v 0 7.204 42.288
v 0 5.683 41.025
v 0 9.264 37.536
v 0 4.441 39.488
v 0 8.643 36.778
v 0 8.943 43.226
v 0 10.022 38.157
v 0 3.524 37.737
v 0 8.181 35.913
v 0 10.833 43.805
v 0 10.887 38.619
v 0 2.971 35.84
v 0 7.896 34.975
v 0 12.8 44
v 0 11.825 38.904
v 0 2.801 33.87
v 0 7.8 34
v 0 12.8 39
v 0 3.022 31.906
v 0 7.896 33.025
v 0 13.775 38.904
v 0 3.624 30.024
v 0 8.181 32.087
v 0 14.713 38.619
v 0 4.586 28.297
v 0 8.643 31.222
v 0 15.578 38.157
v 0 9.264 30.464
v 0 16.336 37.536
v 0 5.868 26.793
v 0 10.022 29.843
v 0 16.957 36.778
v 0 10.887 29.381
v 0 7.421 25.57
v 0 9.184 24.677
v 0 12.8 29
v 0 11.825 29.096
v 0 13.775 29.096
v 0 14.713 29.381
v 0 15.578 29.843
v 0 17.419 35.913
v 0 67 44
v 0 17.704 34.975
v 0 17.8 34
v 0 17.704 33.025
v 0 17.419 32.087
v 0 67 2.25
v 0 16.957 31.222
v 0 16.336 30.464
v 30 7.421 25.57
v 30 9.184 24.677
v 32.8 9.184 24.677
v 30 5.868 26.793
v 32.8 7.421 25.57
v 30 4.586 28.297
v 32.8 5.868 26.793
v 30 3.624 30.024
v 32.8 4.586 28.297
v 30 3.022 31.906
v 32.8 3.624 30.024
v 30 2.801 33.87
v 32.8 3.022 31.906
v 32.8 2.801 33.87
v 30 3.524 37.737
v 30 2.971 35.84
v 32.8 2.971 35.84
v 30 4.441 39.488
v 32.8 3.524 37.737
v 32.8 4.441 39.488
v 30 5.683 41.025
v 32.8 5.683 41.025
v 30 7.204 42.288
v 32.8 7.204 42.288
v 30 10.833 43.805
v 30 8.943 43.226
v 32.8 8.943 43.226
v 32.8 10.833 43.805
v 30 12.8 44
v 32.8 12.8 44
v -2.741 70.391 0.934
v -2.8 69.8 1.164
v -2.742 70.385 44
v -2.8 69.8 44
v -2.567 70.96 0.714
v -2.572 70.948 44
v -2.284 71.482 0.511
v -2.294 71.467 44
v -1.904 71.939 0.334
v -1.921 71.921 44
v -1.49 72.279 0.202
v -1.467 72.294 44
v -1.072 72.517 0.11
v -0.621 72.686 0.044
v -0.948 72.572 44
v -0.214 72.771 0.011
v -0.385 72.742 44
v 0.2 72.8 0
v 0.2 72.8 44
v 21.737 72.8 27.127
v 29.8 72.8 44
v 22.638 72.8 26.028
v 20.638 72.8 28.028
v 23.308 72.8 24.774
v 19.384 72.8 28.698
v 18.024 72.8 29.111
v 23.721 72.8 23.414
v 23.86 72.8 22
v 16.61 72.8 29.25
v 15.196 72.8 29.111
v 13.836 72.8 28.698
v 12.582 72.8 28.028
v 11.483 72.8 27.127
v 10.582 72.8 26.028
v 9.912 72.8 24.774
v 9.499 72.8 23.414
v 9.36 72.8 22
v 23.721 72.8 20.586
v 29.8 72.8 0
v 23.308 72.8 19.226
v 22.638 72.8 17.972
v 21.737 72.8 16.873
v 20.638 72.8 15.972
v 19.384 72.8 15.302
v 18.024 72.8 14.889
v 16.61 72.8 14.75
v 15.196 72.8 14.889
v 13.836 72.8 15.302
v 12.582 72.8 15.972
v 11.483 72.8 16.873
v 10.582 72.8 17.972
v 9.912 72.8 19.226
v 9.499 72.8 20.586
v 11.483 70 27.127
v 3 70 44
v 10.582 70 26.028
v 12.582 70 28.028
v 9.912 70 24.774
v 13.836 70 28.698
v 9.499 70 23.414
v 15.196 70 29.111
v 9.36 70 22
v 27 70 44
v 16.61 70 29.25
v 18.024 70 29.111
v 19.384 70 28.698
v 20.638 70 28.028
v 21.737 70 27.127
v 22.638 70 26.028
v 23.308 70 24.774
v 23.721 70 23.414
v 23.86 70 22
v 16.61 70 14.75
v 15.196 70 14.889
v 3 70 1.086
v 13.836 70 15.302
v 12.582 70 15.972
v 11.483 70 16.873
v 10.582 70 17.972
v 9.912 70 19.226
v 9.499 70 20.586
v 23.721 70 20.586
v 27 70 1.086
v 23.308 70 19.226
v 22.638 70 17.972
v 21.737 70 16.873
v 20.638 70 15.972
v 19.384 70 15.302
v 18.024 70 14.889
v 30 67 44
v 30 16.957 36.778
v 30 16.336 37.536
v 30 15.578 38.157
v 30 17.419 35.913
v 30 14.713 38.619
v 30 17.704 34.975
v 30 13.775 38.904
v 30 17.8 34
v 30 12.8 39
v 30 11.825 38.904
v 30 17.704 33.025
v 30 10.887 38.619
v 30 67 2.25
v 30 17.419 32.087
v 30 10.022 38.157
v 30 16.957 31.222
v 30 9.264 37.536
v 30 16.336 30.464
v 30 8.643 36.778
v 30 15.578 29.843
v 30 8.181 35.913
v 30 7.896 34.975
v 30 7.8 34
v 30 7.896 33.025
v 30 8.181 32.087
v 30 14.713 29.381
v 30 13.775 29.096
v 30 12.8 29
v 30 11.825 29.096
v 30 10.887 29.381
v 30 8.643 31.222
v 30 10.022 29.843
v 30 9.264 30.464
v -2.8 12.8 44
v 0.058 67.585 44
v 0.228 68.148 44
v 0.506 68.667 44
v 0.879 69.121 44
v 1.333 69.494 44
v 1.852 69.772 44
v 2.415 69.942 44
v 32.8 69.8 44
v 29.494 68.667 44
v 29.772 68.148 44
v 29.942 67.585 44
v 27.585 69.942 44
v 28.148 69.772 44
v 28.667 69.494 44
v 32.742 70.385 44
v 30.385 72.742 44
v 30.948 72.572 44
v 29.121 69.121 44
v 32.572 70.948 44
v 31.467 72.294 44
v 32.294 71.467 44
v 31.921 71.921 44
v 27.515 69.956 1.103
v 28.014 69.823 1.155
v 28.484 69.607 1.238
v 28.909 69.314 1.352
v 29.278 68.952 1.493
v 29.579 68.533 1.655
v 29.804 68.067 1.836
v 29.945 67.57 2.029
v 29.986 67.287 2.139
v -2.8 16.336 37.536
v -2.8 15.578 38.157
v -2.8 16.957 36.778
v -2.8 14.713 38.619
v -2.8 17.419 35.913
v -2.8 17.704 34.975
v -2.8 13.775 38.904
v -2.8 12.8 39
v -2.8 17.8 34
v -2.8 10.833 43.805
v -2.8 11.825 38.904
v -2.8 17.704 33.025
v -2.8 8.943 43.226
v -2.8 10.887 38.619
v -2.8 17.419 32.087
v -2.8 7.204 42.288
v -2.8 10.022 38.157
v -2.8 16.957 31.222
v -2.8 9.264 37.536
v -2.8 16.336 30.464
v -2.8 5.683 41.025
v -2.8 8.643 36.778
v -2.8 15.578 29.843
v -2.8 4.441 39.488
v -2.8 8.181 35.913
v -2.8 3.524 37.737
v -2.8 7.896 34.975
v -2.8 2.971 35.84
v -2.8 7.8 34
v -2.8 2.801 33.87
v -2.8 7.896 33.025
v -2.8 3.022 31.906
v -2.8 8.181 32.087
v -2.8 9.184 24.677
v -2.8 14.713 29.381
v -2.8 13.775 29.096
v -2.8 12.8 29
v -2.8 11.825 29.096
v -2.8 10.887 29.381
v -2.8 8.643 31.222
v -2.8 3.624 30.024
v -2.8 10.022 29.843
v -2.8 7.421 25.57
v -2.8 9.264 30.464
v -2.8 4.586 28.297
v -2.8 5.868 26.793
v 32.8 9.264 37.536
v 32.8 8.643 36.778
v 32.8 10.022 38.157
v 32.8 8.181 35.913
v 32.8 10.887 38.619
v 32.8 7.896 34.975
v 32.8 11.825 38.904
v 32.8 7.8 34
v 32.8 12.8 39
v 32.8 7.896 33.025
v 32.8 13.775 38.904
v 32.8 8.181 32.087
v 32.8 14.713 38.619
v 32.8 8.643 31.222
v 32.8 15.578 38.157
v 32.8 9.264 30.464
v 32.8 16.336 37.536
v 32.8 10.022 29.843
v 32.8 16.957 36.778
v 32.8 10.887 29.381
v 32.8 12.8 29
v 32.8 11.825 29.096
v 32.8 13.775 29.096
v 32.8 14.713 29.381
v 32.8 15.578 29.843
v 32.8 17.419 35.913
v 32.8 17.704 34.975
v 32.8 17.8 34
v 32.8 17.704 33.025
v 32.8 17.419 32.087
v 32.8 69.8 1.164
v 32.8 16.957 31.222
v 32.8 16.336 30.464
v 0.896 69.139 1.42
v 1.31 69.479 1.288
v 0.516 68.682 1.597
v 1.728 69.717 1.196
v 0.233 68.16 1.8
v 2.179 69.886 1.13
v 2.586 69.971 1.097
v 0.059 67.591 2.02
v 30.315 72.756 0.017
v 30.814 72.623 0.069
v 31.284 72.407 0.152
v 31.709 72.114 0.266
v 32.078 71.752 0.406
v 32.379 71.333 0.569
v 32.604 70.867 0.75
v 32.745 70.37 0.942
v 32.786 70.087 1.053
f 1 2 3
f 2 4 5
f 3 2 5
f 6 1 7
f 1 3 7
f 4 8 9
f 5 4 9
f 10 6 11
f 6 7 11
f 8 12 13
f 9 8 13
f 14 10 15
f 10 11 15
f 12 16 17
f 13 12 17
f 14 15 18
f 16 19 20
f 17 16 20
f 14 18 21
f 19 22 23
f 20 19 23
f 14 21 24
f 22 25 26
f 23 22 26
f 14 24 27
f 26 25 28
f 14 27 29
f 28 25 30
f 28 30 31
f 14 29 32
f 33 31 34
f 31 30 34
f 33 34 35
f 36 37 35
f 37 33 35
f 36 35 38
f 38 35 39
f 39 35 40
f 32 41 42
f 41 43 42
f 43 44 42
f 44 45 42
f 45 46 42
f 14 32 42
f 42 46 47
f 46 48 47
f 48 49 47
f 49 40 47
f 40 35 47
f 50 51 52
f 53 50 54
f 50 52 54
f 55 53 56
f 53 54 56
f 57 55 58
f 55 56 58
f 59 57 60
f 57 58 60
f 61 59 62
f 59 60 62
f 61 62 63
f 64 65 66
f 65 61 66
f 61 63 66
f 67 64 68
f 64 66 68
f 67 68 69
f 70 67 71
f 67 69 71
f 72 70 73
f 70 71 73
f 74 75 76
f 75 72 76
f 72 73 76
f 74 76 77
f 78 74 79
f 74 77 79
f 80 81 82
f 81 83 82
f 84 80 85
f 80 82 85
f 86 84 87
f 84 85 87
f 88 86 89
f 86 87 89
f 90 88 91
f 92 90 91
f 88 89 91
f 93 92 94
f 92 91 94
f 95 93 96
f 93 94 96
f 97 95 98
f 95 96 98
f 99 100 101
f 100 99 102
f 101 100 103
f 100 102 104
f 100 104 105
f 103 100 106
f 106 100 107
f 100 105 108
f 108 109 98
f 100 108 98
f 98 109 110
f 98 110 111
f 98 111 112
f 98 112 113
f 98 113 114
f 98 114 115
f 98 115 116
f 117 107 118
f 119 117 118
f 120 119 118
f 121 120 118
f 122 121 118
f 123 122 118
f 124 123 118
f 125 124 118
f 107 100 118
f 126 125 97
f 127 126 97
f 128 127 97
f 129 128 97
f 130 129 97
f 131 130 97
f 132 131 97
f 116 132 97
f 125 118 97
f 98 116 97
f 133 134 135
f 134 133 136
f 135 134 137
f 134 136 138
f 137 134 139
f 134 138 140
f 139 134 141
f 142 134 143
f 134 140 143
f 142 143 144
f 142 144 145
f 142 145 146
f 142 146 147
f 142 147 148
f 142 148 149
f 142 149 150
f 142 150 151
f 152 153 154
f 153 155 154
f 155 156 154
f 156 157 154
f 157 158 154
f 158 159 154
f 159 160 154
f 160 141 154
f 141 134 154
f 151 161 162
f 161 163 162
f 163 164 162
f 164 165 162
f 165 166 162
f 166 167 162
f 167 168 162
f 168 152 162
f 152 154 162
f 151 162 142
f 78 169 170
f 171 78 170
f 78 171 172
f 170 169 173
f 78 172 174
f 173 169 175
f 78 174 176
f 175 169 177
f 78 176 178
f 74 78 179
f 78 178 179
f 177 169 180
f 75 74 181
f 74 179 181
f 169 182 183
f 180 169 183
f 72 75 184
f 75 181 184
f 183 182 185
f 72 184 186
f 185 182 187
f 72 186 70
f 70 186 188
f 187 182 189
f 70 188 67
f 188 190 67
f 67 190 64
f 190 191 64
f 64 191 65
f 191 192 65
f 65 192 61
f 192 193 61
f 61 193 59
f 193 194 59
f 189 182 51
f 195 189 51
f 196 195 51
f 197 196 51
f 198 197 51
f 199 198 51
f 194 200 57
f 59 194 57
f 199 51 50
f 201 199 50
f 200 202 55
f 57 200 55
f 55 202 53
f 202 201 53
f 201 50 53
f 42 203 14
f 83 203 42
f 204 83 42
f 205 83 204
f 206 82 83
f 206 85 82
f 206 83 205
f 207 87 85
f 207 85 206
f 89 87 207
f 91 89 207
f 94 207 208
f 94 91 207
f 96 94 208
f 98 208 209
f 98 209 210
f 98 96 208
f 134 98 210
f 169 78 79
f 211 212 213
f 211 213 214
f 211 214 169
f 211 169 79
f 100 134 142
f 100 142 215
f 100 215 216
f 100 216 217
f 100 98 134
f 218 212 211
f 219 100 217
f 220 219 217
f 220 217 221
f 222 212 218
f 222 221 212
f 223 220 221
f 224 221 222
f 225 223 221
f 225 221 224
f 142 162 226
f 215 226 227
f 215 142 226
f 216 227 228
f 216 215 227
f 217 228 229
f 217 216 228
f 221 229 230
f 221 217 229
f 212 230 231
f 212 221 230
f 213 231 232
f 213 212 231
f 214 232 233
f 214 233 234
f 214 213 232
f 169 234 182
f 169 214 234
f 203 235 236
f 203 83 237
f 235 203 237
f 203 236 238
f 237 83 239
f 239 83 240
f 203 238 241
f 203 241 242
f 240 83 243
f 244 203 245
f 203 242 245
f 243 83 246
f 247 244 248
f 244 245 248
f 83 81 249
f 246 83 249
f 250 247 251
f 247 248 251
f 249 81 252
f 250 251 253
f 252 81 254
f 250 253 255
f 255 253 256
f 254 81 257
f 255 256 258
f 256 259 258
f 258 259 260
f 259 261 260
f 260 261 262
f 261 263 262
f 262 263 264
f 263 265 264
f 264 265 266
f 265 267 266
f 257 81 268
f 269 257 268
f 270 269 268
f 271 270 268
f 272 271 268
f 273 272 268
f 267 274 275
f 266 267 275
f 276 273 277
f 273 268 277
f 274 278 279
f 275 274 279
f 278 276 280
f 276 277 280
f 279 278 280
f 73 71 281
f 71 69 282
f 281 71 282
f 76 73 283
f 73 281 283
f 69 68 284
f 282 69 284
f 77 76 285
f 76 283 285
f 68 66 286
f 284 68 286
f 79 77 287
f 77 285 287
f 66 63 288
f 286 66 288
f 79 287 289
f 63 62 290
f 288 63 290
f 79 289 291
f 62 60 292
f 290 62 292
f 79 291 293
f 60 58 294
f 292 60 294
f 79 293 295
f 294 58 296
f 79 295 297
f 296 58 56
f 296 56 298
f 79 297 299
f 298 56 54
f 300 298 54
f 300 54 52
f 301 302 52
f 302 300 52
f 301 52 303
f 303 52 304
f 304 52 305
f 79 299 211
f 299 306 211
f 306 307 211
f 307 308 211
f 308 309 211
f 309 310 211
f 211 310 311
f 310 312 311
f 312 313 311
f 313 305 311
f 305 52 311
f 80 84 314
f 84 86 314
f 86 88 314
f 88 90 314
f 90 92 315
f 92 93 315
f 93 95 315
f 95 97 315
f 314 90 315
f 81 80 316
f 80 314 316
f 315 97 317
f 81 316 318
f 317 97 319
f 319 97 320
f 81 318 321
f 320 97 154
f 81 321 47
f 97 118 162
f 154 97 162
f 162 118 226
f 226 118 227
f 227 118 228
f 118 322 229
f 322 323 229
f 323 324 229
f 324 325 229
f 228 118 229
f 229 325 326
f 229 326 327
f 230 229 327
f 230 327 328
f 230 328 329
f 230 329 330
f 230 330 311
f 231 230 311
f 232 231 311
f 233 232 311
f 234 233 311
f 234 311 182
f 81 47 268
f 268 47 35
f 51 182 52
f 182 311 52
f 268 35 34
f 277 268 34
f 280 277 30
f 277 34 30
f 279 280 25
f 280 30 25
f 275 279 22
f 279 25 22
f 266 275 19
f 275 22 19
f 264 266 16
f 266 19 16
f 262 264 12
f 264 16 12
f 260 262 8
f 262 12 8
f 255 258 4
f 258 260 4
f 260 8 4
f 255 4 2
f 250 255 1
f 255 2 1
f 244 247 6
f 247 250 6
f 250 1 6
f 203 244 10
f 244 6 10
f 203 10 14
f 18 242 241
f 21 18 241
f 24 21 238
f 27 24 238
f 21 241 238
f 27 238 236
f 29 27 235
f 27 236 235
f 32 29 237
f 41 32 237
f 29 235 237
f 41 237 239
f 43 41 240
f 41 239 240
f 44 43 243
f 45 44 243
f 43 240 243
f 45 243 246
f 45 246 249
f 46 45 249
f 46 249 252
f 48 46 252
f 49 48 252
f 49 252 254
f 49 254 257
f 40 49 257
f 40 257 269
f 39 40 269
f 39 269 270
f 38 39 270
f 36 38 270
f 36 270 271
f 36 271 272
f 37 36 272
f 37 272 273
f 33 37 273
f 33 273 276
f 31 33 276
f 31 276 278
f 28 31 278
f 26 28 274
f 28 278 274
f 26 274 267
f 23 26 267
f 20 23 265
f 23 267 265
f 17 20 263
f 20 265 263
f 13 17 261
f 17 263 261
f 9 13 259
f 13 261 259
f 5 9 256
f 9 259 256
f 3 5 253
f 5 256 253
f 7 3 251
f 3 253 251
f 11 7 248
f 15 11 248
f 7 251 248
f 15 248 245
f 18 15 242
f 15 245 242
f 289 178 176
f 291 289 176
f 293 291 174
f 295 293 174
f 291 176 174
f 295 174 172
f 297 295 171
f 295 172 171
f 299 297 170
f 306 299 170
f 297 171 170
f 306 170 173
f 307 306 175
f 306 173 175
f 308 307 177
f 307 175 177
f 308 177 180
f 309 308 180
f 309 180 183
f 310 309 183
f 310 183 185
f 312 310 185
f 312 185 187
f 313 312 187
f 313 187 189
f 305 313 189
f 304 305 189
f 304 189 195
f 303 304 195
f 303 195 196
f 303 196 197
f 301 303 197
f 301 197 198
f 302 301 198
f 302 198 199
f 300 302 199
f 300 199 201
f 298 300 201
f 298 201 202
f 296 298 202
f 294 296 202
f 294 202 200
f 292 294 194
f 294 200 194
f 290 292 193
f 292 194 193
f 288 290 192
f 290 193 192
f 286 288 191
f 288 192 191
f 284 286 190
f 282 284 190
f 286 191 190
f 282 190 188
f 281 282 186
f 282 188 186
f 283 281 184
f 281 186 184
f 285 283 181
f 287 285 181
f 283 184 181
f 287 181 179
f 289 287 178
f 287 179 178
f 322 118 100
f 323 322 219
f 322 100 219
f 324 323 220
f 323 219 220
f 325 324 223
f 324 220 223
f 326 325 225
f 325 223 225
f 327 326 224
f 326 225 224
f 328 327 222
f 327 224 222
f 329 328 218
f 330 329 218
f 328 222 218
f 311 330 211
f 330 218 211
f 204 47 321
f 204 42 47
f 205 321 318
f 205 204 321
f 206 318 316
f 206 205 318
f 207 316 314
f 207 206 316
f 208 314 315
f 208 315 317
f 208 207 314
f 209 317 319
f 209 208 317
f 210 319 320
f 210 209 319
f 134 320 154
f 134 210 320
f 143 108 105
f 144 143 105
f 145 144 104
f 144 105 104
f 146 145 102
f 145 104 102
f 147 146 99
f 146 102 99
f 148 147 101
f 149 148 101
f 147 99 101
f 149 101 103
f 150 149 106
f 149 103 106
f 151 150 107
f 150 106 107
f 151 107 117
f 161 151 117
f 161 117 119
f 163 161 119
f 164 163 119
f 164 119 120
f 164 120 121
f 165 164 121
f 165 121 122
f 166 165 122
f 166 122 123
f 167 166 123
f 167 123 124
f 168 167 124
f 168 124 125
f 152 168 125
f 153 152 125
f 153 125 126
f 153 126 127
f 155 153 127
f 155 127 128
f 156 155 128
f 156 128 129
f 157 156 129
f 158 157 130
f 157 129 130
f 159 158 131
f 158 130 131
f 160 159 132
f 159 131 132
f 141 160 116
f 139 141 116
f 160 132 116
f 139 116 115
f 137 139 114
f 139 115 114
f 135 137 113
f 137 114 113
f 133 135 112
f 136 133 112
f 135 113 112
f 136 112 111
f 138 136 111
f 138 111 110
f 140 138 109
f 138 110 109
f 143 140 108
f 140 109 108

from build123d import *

# Parameters (mm, degrees)
EXTRUDE_THIN1_DEPTH = 44
SKETCH3_OUTSIDE_W   = 64.442
SKETCH3_OUTSIDE_H   = 93.242
CUT_EXTRUDE1_DEPTH  = 93.212797377
SKETCH4_R           = 5
CUT_EXTRUDE2_DEPTH  = 93.212797377
SKETCH5_R           = 7.25
CUT_EXTRUDE3_DEPTH  = 10
FILLET3_R           = 3


with BuildPart() as part:
    # Sketch1 → Extrude-Thin1 (new body)
    with BuildSketch(Plane.XY):
        Polygon((0, 0), (0, 70), (30, 70), (30, 0), (32.8, 0), (32.8, 72.8), (-2.8, 72.8), (-2.8, 0), align=None)
    extrude(amount=EXTRUDE_THIN1_DEPTH)

    # Sketch3 outside → Cut-Extrude1 (cut, through all)
    with BuildSketch(Plane(origin=(32.8, 0, 0), x_dir=(0, 0, -1), z_dir=(1, 0, 0))):
        with Locations((-22, 36.4)):
            Rectangle(SKETCH3_OUTSIDE_W, SKETCH3_OUTSIDE_H)
        with BuildLine():
            Line((-44, 12.8), (-44, 72.8))
            Line((-44, 72.8), (0, 72.8))
            Line((0, 72.8), (-24.676843343, 9.183544561))
            ThreePointArc((-24.676843343, 9.183544561), (-35.839624069, 2.9706672), (-44, 12.8))
        make_face(mode=Mode.SUBTRACT)
    extrude(amount=-CUT_EXTRUDE1_DEPTH, mode=Mode.SUBTRACT)

    # Sketch4 → Cut-Extrude2 (cut, through all)
    with BuildSketch(Plane.ZY.offset(2.8)):
        with Locations((34, 12.8)):
            Circle(SKETCH4_R)
    extrude(amount=-CUT_EXTRUDE2_DEPTH, mode=Mode.SUBTRACT)

    # Sketch5 → Cut-Extrude3 (cut)
    with BuildSketch(Plane(origin=(0, 72.8, 0), x_dir=(1, 0, 0), z_dir=(0, 1, 0))):
        with Locations(Location((16.61, -22, 0), (0, 0, 270))):
            Circle(SKETCH5_R)
    extrude(amount=-CUT_EXTRUDE3_DEPTH, mode=Mode.SUBTRACT)

    # Fillet3
    fillet3_edges = [part.edges().sort_by_distance(p)[0] for p in [
        (30, 70, 22.543060446),
        (0, 70, 22.543060446),
        (-2.8, 72.8, 22),
        (32.8, 72.8, 22),
    ]]
    fillet(fillet3_edges, radius=FILLET3_R)


solid = part.part
